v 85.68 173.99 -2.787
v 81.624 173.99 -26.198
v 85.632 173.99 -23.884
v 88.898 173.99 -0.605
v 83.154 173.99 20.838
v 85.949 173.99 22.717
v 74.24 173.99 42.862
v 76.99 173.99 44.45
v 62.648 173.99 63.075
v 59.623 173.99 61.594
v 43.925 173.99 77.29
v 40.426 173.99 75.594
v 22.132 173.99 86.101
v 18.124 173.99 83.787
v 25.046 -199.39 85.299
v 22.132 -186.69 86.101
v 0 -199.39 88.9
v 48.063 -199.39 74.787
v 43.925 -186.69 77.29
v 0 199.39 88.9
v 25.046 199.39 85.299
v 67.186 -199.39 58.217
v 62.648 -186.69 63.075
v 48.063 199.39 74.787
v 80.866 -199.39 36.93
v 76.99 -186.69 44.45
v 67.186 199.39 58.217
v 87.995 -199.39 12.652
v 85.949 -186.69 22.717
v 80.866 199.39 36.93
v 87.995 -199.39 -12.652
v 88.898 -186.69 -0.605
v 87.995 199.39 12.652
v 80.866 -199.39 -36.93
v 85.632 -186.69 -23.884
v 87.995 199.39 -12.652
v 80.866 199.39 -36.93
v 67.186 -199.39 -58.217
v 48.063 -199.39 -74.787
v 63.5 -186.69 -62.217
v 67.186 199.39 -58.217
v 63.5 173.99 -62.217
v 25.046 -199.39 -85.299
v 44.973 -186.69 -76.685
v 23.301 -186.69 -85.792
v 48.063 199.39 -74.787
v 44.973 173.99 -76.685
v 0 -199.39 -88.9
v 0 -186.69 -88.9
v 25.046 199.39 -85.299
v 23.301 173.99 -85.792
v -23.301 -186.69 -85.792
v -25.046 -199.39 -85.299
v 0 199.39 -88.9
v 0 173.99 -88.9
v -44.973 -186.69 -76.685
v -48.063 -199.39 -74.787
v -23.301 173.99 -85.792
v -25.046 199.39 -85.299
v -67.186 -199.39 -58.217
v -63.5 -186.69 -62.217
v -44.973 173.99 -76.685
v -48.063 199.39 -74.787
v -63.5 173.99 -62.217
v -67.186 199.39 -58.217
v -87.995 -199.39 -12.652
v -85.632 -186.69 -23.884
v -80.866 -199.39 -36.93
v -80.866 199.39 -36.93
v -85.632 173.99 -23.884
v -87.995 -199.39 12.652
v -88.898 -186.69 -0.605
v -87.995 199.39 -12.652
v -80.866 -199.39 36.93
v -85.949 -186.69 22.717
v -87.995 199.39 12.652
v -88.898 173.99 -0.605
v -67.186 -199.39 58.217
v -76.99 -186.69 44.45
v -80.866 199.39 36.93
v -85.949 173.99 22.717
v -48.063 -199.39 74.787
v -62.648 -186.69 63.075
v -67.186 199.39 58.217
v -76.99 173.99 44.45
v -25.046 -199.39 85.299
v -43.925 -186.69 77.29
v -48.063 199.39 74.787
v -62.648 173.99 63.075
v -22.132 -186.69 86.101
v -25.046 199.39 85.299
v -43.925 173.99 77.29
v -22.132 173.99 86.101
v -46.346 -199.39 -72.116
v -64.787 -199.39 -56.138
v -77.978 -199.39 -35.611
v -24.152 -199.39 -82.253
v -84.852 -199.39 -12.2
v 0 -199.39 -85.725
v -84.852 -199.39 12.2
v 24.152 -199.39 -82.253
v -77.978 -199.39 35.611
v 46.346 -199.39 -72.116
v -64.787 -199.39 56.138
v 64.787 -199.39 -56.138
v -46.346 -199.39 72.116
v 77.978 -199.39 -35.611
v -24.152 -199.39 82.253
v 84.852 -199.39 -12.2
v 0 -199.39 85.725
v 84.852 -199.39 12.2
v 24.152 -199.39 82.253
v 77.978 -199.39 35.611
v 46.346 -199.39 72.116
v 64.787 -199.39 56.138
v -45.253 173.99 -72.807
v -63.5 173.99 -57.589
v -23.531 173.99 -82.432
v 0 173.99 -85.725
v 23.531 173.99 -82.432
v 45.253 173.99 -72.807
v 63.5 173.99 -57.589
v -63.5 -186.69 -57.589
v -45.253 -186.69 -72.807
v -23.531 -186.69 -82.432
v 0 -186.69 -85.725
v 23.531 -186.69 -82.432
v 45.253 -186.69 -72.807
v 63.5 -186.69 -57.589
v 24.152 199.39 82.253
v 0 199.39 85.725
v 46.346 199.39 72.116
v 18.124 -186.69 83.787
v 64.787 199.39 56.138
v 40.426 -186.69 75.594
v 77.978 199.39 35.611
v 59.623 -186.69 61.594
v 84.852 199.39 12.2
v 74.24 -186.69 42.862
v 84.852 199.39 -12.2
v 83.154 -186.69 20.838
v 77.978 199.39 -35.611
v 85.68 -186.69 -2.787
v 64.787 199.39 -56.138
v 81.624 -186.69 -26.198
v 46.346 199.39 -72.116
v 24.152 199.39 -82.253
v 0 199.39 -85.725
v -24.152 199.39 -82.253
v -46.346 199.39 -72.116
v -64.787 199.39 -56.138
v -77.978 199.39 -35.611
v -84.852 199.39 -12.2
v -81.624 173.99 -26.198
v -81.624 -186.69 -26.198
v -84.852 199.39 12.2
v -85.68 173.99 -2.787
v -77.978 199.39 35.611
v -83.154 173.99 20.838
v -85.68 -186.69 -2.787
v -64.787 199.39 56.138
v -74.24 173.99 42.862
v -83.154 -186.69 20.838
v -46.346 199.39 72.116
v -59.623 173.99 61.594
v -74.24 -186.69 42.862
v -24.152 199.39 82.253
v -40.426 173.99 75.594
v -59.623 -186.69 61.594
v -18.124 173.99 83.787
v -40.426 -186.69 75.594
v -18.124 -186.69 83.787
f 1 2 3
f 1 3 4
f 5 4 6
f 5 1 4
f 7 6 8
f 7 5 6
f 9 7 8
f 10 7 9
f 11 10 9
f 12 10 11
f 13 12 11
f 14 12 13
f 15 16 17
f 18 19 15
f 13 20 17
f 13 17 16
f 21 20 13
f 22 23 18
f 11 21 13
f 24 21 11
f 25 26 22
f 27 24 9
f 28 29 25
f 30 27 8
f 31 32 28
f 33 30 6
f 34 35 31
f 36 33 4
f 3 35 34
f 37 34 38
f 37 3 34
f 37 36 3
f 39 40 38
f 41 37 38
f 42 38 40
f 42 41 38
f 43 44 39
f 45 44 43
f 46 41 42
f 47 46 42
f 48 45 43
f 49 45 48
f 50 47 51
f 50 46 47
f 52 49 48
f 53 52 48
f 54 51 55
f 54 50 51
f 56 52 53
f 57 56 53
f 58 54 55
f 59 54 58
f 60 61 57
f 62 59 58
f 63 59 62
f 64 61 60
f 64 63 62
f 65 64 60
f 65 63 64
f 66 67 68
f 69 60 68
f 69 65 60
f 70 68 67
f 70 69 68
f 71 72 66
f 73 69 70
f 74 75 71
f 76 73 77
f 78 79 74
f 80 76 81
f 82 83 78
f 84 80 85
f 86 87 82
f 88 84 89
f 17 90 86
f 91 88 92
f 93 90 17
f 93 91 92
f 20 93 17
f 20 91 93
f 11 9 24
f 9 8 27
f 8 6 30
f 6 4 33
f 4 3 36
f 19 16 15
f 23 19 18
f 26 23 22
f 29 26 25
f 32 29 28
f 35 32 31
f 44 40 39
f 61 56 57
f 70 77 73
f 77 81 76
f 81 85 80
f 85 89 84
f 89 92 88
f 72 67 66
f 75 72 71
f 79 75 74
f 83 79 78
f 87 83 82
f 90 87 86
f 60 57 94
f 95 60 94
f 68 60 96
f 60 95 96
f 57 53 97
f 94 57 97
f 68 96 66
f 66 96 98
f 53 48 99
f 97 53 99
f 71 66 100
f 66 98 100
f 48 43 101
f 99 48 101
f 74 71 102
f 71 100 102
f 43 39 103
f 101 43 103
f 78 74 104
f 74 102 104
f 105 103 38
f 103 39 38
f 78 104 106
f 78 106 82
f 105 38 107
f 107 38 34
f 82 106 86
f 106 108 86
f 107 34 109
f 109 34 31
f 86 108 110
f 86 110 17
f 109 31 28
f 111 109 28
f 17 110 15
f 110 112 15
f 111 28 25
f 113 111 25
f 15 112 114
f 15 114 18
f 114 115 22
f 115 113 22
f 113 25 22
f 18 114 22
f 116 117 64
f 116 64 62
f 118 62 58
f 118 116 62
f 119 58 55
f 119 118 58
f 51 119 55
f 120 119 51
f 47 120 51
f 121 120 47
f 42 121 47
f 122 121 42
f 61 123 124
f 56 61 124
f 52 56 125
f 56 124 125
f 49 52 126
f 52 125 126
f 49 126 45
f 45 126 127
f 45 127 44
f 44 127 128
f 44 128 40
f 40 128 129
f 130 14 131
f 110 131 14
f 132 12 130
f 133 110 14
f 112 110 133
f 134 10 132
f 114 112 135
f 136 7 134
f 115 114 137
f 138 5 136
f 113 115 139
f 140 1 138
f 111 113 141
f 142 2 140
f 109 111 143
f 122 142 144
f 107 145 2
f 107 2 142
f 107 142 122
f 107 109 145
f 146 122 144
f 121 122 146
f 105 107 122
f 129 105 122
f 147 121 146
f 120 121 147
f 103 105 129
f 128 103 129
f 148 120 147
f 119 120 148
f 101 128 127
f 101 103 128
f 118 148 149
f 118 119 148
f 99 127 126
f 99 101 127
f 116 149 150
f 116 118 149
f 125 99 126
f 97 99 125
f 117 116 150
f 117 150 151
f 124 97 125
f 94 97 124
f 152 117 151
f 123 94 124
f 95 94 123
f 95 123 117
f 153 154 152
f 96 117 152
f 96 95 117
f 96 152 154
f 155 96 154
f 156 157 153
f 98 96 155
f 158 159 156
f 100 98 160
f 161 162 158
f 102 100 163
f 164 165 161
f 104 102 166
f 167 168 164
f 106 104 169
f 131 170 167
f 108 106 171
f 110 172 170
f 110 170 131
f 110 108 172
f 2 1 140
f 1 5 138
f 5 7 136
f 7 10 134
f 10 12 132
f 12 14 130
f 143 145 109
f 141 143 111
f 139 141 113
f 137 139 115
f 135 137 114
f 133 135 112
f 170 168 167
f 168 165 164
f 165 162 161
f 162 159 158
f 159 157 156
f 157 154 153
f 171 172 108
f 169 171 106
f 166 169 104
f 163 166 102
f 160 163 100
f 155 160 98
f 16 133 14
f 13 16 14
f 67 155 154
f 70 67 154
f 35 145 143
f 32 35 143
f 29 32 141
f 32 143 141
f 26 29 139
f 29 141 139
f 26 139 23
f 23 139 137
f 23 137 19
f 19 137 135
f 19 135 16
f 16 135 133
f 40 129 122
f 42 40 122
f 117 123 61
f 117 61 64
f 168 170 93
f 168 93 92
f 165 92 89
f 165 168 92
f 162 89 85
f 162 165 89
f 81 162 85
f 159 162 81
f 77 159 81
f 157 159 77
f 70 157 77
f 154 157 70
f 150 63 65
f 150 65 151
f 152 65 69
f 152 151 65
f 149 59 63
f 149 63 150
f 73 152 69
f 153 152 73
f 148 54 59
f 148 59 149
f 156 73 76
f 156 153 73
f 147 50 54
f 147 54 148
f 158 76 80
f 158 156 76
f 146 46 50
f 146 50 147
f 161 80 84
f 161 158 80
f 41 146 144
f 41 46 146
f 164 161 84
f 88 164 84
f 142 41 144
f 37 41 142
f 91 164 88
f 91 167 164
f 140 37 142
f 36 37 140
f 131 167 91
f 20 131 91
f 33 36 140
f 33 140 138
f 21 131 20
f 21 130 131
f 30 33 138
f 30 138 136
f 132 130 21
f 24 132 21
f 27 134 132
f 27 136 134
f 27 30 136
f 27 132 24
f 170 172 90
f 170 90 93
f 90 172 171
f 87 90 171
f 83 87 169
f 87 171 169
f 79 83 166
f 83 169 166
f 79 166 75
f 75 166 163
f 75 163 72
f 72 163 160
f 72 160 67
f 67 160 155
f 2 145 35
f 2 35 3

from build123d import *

# Parameters (mm, degrees)
SKETCH1_R               = 88.9
SKETCH1_R_2             = 85.725
BOSS_EXTRUDE1_DEPTH     = 199.39
CUT_EXTRUDE1_REACH      = 237.718
CUT_EXTRUDE1_END_RADIUS = 88.9
SKETCH2_W               = 127
SKETCH2_H               = 360.68
CIRPATTERN1_COUNT       = 3


with BuildPart() as part:
    # Sketch1 → Boss-Extrude1 (new, symmetric)
    with BuildSketch(Plane(origin=(0, 0, 0), x_dir=(1, 0, 0), z_dir=(0, 1, 0))):
        with Locations(Location((0, 0, 0), (0, 0, 270))):
            Circle(SKETCH1_R)
        with Locations(Location((0, 0, 0), (0, 0, 270))):
            Circle(SKETCH1_R_2, mode=Mode.SUBTRACT)
    extrude(amount=BOSS_EXTRUDE1_DEPTH, both=True)

    # Cut-Extrude1: up to this cylinder (the profile starts inside it)
    cut_extrude1_end = Plane(origin=(0, -6.35, 0), z_dir=(0, -1, 0)) * Cylinder(CUT_EXTRUDE1_END_RADIUS, 654.236, mode=Mode.PRIVATE)
    # Sketch2 → Cut-Extrude1 (cut, up to the surface)
    with BuildSketch(Plane.XY, mode=Mode.PRIVATE) as cut_extrude1_sk1:
        with Locations((0, -6.35)):
            Rectangle(SKETCH2_W, SKETCH2_H)
    cut_extrude1_tool1 = extrude(cut_extrude1_sk1.sketch, amount=-CUT_EXTRUDE1_REACH, mode=Mode.PRIVATE) & cut_extrude1_end
    cut_extrude1 = cut_extrude1_tool1.solids().sort_by_distance((0, -6.35, 0))[0]
    add(cut_extrude1, mode=Mode.SUBTRACT)

    # CirPattern1: Cut-Extrude1 ×3 about axis
    cirpattern1_axis = Axis((0, 0, 0), (0, 1, 0))
    for i in range(1, CIRPATTERN1_COUNT):
        add(cut_extrude1.rotate(cirpattern1_axis, i * 360 / CIRPATTERN1_COUNT), mode=Mode.SUBTRACT)


solid = part.part
